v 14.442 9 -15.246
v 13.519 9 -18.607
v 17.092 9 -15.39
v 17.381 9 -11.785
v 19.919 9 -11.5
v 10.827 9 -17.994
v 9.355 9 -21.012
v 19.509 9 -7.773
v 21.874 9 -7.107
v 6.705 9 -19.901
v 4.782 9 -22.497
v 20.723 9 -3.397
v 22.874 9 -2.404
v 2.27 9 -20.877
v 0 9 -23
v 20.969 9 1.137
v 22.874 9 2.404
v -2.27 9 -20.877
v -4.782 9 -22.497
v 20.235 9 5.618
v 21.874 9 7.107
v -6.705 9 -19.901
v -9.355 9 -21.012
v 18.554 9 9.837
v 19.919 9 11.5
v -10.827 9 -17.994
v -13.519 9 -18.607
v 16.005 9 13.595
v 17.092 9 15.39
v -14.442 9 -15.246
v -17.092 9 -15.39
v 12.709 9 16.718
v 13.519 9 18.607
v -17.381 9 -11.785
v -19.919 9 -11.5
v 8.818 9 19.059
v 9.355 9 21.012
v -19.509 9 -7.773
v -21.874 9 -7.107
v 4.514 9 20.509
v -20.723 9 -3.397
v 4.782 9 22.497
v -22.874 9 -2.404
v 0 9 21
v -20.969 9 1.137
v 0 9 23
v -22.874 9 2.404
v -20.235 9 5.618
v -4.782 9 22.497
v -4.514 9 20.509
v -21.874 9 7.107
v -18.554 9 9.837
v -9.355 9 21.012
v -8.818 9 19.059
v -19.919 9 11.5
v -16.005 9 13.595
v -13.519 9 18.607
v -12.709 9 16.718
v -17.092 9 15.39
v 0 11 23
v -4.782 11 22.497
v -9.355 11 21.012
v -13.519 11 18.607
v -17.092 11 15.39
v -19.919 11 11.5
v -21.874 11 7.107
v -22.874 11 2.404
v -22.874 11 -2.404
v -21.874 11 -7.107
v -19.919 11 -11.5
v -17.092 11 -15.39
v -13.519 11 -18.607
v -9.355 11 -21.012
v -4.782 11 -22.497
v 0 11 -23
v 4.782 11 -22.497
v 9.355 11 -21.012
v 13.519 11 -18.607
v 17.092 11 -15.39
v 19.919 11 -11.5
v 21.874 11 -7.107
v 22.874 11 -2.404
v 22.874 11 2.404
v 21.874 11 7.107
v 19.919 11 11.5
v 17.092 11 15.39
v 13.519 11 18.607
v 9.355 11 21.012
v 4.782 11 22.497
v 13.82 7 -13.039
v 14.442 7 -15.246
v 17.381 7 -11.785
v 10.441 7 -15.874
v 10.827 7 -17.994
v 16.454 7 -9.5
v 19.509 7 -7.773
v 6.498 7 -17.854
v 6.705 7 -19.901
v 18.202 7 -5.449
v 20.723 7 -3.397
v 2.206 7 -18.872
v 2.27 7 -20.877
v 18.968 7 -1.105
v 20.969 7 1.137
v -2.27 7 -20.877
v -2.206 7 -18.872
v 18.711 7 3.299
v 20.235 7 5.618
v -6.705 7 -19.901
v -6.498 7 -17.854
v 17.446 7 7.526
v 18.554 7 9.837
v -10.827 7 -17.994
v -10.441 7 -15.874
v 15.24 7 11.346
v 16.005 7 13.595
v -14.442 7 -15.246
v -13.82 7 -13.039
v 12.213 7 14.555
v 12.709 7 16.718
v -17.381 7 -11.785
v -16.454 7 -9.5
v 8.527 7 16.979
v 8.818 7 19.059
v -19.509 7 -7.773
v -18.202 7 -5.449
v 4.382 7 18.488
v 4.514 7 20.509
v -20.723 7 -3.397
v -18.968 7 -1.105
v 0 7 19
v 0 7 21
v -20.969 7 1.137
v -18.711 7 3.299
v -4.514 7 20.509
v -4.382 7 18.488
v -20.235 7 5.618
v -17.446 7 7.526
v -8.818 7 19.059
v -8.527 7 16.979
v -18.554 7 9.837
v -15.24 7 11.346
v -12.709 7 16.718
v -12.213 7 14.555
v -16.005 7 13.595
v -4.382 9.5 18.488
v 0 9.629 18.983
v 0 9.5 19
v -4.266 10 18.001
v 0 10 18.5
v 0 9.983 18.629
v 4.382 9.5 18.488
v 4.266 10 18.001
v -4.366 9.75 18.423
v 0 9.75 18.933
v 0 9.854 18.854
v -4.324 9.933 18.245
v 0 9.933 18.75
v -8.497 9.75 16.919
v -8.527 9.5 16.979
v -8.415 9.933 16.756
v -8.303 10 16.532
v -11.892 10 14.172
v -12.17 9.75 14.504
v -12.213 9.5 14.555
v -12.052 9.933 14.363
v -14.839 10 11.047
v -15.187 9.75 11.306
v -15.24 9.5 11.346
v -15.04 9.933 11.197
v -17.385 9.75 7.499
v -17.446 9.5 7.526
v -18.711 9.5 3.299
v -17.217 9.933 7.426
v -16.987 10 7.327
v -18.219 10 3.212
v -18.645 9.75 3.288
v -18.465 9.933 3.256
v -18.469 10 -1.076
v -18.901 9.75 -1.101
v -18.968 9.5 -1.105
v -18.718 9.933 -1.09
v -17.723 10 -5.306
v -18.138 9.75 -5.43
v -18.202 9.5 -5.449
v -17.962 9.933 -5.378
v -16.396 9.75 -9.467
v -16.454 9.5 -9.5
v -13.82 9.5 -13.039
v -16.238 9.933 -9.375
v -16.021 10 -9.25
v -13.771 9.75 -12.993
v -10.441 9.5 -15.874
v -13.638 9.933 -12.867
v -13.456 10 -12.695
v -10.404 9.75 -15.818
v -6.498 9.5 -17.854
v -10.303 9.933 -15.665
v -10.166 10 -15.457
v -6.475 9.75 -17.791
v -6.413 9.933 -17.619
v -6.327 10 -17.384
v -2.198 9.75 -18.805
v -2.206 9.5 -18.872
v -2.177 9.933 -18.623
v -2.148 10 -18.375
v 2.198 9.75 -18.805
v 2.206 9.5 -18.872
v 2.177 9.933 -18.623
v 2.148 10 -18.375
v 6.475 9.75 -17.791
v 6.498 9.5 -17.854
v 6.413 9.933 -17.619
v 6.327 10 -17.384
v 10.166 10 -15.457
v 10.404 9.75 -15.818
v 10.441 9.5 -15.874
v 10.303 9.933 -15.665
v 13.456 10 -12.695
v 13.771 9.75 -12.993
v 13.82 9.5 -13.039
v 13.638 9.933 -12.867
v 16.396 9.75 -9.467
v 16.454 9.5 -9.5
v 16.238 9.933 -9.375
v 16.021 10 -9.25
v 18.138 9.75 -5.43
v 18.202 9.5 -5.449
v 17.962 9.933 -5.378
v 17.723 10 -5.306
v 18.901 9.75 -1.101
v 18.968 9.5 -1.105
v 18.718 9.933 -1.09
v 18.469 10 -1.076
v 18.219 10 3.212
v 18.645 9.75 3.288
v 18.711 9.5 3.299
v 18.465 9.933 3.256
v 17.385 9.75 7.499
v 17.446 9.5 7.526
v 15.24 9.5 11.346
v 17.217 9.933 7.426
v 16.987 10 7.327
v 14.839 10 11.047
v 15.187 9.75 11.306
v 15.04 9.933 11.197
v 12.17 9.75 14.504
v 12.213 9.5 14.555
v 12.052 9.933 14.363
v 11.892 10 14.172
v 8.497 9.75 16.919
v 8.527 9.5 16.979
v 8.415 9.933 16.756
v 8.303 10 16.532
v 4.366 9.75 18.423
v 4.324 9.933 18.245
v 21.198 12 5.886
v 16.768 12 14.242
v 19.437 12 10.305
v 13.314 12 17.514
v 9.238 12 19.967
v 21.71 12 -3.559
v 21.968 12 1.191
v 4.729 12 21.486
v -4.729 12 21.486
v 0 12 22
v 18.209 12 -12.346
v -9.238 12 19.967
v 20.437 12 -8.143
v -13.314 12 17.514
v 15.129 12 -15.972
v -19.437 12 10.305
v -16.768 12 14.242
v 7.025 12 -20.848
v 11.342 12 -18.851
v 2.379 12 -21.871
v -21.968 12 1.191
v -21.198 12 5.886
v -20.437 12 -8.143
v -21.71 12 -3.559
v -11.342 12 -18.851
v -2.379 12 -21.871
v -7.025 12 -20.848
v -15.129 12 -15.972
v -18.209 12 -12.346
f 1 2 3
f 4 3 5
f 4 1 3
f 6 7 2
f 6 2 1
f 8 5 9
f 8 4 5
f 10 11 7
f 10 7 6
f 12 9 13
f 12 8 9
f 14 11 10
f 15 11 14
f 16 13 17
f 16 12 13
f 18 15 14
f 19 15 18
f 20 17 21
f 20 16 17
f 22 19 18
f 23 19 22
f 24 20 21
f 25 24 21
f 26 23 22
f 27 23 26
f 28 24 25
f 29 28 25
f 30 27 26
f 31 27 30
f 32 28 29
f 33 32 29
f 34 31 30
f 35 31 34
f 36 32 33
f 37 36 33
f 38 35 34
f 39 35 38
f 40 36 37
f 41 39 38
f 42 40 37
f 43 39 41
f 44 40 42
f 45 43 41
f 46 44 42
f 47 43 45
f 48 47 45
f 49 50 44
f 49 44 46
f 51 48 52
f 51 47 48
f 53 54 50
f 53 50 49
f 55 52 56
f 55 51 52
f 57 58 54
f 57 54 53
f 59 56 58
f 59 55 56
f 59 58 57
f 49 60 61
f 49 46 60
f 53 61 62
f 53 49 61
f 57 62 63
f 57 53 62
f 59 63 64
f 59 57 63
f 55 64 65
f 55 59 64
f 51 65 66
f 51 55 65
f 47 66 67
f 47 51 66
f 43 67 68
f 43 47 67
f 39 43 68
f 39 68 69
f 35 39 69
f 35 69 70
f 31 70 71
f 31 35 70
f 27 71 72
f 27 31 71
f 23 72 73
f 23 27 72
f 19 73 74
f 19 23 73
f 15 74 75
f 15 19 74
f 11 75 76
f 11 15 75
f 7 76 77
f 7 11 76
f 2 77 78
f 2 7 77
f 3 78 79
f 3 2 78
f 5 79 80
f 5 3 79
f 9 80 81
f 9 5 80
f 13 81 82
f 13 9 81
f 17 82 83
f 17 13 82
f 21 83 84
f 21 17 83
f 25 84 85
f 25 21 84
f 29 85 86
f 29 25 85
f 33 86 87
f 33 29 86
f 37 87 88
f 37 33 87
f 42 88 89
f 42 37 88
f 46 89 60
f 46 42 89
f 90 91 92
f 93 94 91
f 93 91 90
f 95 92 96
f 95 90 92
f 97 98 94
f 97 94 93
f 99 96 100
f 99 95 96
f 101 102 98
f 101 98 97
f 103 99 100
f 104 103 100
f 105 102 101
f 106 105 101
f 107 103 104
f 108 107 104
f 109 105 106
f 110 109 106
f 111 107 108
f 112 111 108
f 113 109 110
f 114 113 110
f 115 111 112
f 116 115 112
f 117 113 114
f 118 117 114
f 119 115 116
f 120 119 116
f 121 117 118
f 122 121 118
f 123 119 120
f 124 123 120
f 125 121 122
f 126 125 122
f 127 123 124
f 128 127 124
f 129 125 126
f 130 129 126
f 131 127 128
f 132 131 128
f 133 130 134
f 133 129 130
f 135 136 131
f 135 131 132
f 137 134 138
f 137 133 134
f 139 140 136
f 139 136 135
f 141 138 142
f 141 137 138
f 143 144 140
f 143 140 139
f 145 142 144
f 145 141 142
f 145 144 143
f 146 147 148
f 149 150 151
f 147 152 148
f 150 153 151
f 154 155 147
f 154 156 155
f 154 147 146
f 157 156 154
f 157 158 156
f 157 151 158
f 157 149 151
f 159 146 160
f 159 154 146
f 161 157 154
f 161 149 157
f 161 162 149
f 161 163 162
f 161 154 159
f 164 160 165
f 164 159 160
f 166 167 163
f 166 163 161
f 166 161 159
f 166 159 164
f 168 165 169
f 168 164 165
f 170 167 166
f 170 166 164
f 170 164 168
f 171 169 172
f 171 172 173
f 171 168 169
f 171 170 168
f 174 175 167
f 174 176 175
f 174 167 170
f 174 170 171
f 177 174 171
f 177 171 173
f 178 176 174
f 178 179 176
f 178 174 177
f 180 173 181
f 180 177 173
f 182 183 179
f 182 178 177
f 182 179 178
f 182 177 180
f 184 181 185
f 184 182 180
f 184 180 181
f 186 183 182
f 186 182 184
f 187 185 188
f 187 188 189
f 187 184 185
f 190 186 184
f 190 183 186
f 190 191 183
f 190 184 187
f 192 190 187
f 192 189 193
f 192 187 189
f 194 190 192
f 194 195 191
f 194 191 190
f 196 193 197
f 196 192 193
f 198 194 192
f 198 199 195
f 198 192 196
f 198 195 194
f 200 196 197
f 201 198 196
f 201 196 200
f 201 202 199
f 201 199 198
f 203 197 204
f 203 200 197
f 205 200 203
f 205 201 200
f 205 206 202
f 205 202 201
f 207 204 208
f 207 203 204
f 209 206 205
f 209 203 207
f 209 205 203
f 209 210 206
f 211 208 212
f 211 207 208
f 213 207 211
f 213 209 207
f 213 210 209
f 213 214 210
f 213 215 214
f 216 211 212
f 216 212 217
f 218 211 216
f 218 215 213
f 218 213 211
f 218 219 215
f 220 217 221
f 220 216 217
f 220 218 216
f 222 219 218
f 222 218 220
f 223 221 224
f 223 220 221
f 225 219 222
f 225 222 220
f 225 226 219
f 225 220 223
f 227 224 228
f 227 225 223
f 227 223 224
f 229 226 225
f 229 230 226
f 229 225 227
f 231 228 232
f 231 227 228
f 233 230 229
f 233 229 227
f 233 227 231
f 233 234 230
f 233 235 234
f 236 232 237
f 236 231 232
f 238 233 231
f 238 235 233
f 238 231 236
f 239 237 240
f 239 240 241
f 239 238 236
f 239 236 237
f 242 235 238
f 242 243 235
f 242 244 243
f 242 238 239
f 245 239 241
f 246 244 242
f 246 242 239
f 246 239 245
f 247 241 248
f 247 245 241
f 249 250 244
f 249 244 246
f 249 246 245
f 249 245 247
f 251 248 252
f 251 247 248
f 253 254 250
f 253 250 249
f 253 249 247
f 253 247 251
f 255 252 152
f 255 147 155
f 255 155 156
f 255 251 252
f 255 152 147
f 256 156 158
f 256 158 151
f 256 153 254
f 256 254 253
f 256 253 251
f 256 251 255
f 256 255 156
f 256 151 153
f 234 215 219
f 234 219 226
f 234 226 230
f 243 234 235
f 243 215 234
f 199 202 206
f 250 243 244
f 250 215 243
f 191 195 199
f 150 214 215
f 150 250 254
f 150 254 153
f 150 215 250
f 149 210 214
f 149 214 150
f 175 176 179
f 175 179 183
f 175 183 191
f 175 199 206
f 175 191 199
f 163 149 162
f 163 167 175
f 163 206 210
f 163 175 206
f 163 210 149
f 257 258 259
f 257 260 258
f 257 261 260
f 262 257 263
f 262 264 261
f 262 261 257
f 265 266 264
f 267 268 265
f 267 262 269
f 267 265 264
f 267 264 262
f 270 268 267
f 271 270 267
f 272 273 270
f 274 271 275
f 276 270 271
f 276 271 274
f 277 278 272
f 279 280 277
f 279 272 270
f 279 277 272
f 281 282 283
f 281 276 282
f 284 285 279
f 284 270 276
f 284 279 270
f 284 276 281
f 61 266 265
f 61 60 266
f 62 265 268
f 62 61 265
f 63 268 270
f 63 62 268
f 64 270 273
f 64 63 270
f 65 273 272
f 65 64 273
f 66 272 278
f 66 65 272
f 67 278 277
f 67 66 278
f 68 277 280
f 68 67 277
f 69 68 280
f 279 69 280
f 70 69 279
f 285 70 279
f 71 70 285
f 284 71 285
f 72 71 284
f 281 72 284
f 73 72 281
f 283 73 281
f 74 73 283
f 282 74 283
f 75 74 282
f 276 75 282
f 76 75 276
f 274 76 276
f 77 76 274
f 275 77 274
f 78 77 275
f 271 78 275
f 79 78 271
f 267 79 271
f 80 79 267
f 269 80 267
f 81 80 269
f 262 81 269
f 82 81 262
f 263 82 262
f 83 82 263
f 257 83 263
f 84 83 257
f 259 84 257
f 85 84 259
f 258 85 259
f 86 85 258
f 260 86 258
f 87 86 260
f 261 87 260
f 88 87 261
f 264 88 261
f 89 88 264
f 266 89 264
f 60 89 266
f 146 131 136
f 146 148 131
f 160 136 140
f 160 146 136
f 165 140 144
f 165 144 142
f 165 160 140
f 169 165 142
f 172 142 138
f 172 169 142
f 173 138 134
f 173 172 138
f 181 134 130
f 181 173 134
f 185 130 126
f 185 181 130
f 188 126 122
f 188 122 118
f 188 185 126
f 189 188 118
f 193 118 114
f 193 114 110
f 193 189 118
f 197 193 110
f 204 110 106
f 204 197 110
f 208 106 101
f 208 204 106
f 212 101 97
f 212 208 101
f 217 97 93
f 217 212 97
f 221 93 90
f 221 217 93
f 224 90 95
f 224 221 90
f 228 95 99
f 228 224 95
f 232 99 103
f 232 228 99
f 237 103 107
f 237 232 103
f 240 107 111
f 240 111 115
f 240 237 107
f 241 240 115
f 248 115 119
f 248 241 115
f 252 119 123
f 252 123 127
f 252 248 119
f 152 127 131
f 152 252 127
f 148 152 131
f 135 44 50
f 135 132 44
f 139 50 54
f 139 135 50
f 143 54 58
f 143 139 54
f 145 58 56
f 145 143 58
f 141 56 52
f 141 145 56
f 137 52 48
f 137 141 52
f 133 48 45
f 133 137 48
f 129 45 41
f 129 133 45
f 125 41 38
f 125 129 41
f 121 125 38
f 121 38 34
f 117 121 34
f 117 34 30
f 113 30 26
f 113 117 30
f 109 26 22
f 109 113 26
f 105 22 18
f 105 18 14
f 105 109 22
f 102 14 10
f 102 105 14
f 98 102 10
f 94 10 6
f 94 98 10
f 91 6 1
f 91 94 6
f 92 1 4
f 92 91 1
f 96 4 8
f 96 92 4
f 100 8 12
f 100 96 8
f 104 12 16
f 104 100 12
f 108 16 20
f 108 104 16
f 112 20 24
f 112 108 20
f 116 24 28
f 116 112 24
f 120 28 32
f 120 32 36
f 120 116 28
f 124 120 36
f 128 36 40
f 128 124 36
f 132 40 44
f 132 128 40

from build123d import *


with BuildPart() as part:
    # Esquisse1 → Base-Révolution (revolve)
    with BuildSketch(Plane.XY, mode=Mode.PRIVATE) as base_r_volution_sk:
        with BuildLine():
            Line((0, 12), (22, 12))
            Line((22, 12), (23, 11))
            Line((23, 11), (23, 9))
            Line((23, 9), (21, 9))
            Line((21, 9), (21, 7))
            Line((21, 7), (19, 7))
            Line((19, 7), (19, 9.5))
            ThreePointArc((19, 9.5), (18.853553391, 9.853553391), (18.5, 10))
            Line((18.5, 10), (0, 10))
            Line((0, 10), (0, 12))
        make_face()
    revolve(base_r_volution_sk.sketch.rotate(Axis((0, 60, 0), (0, -1, 0)), 90), axis=Axis((0, 60, 0), (0, -1, 0)))


solid = part.part
